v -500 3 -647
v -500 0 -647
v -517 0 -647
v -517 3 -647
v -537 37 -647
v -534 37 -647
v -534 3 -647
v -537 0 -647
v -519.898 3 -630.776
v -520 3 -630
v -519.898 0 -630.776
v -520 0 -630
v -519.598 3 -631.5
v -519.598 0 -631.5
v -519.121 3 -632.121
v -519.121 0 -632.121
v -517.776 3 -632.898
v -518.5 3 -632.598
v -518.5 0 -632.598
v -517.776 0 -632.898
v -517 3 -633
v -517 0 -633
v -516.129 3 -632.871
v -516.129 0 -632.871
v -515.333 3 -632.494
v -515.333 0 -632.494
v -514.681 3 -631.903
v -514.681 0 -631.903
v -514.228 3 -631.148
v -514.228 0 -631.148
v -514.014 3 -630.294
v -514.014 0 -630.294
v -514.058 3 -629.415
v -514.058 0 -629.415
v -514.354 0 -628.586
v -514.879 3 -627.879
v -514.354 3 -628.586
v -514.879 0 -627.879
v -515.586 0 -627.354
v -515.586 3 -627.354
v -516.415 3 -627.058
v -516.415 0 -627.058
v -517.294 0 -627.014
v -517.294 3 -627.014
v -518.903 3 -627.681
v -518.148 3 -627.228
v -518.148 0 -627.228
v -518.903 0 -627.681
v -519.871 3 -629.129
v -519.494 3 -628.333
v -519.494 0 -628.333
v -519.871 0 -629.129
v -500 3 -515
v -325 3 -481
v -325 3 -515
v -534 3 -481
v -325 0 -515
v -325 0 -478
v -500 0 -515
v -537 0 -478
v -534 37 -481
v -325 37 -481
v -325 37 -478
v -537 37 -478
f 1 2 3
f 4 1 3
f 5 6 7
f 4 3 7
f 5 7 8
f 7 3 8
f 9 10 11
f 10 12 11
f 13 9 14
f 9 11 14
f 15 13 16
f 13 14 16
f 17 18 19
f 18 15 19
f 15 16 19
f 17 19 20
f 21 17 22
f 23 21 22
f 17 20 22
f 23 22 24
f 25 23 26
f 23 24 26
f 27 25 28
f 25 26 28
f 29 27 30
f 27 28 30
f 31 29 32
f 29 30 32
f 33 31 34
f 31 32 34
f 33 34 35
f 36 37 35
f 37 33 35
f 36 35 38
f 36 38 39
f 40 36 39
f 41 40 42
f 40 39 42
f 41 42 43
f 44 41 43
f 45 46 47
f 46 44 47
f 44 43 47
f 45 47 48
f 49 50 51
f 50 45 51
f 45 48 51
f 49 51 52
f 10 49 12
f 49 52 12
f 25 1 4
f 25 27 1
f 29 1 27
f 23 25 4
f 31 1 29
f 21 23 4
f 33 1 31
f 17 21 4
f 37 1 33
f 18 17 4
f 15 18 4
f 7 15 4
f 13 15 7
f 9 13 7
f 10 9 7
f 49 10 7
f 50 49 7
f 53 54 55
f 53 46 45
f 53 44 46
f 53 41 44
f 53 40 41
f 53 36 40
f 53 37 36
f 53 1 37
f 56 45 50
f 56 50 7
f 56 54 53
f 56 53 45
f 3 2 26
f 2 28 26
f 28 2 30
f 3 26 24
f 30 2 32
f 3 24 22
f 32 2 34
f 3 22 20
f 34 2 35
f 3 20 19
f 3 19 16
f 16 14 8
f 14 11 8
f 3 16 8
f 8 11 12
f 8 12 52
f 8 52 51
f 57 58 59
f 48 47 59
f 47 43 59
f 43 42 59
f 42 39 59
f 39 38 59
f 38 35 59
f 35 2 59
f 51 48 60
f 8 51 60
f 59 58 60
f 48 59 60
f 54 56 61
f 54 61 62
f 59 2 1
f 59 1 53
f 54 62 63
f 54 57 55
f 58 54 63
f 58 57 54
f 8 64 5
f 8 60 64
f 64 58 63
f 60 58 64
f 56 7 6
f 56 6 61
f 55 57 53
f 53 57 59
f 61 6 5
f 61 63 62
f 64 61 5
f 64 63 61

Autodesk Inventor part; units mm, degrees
ref_plane "YZ Plane" through (0, 0, 0) normal (1, 0, 0) x (0, 1, 0)
ref_plane "XZ Plane" through (0, 0, 0) normal (0, 1, 0) x (-1, 0, 0)
ref_plane "XY Plane" through (0, 0, 0) normal (0, 0, 1) x (1, 0, 0)
sketch "Sketch1" plane through (0, 0, 0) normal (0, 1, 0) x (-1, 0, 0)
  line L0 (0, 0) -> (0, -650)
  line L1 (0, -650) -> (650, -650)
  line L2 (650, -650) -> (650, 0)
  line L3 (650, 0) -> (0, 0)
  line L4 (0, 0) -> (3, 0)
  line L5 (3, -3) -> (3, -647)
  line L6 (3, -650) -> (0, -650)
  line L7 (0, -650) -> (0, -647)
  line L8 (650, -647) -> (650, -650)
  line L9 (650, -650) -> (647, -650)
  line L10 (647, -650) -> (647, 0)
  line L11 (647, 0) -> (650, 0)
  line L12 (650, 0) -> (650, -3)
  line L13 (0, -3) -> (0, 0)
  line L14 (0, 0) -> (0, -37)
  line L15 (650, -37) -> (650, 0)
  line L16 (650, 0) -> (613, 0)
  line L17 (613, 0) -> (613, -650)
  line L18 (613, -650) -> (650, -650)
  line L19 (650, -650) -> (650, -613)
  line L20 (0, -613) -> (0, -650)
  line L21 (0, -650) -> (37, -650)
  line L22 (37, 0) -> (0, 0)
  line L23 (3, -147.3087) -> (3, -94.9828)
  line L24 (147.3087, -3) -> (94.9828, -3)
  circle A0 centre (16.1109, -108.0348) radius 3
  line L25 (0, -650) -> (3, -650)
  line L26 (0, -647) -> (0, -650)
  line L27 (0, -650) -> (0, -613)
  line L28 (37, -650) -> (0, -650)
  line L29 (3, -502.6913) -> (3, -555.0172)
  line L30 (147.3087, -647) -> (94.9828, -647)
  circle A1 centre (16.1109, -541.9652) radius 3
  line L31 (37, -650) -> (37, -37)
  line L32 (37, -3) -> (37, 0)
  line L33 (650, -3) -> (34.9546, -3)
  line L34 (34.9546, -647) -> (650, -647)
  line L35 (37, -37) -> (0, 0)
  line L36 (37, -613) -> (0, -650)
  line L37 (0, -650) -> (3, -647)
  line L38 (3, -647) -> (3, -3)
  line L39 (3, -3) -> (0, 0)
  line L40 (3, -325) -> (3, -458)
  line L41 (3, -458) -> (20, -458)
  line L42 (3, -325) -> (3, -192)
  line L43 (3, -192) -> (20, -192)
  circle A2 centre (20, -192) radius 3
  circle A3 centre (20, -458) radius 3
  line L44 (325, -650) -> (192, -650)
  circle A4 centre (192, -630) radius 3
  line L45 (3, -458) -> (3, -475)
  line L46 (3, -475) -> (647, -475)
  line L47 (3, -475) -> (3, -478)
  line L48 (3, -478) -> (647, -478)
  line L49 (175, -630) -> (175, -481)
  line L50 (175, -630) -> (175, -647)
  line L51 (209, -630) -> (209, -647)
  line L52 (209, -647) -> (175, -647)
  line L53 (175, -647) -> (172, -647)
  line L54 (172, -647) -> (172, -478)
  line L55 (325, -650) -> (325, -478)
  line L56 (325, -478) -> (172, -478)
  line L57 (325, -481) -> (175, -481)
  line L58 (325, -515) -> (209, -515)
  line L59 (209, -630) -> (209, -515)
  line L60 (650, -650) -> (517, -650)
  line L61 (517, -650) -> (517, -647)
  line L62 (517, -647) -> (517, -630)
  line L63 (517, -647) -> (500, -647)
  line L64 (517, -647) -> (534, -647)
  circle A5 centre (517, -630) radius 3
  line L65 (534, -647) -> (534, -481)
  line L66 (325, -478) -> (325, -515)
  line L67 (325, -515) -> (500, -515)
  line L68 (534, -481) -> (325, -481)
  line L69 (325, -481) -> (325, -478)
  line L70 (500, -647) -> (500, -515)
  line L71 (534, -478) -> (537, -478)
  line L72 (537, -478) -> (537, -647)
  line L73 (537, -647) -> (534, -647)
  point P0 (37, -647)
  dimension "d0" = 650
  dimension "d1" = 650
  dimension "d2" = 650
  dimension "d3" = 3
  dimension "d4" = 650
  dimension "d5" = 3
  dimension "d6" = 3
  dimension "d7" = 650
  dimension "d8" = 3
  dimension "d9" = 650
  dimension "d10" = 37
  dimension "d12" = 37
  dimension "d13" = 650
  dimension "d14" = 37
  dimension "d15" = 650
  dimension "d16" = 37
  dimension "d28" = 6
  dimension "d33" = 133
  dimension "d34" = 17
  dimension "d35" = 133
  dimension "d36" = 17
  dimension "d37" = 6
  dimension "d38" = 6
  dimension "d41" = 133
  dimension "d43" = 6
  dimension "d44" = 17
  dimension "d45" = 3
  dimension "d47" = 17
  dimension "d48" = 3
  dimension "d55" = 133
  dimension "d56" = 17
  dimension "d57" = 17
  dimension "d58" = 17
  dimension "d59" = 6
  dimension "d60" = 37
  dimension "d61" = 3
  dimension "d62" = 3
extrude "Extrusion6" add sketch "Sketch1" along normal blind 3 contours L68 L65 L34 L70 L67 L55
extrude "Extrusion7" add sketch "Sketch1" along normal blind 37 contours L48 L72 L34 L65 L68 L55
properties part number "body_inner_L_support(2)"
